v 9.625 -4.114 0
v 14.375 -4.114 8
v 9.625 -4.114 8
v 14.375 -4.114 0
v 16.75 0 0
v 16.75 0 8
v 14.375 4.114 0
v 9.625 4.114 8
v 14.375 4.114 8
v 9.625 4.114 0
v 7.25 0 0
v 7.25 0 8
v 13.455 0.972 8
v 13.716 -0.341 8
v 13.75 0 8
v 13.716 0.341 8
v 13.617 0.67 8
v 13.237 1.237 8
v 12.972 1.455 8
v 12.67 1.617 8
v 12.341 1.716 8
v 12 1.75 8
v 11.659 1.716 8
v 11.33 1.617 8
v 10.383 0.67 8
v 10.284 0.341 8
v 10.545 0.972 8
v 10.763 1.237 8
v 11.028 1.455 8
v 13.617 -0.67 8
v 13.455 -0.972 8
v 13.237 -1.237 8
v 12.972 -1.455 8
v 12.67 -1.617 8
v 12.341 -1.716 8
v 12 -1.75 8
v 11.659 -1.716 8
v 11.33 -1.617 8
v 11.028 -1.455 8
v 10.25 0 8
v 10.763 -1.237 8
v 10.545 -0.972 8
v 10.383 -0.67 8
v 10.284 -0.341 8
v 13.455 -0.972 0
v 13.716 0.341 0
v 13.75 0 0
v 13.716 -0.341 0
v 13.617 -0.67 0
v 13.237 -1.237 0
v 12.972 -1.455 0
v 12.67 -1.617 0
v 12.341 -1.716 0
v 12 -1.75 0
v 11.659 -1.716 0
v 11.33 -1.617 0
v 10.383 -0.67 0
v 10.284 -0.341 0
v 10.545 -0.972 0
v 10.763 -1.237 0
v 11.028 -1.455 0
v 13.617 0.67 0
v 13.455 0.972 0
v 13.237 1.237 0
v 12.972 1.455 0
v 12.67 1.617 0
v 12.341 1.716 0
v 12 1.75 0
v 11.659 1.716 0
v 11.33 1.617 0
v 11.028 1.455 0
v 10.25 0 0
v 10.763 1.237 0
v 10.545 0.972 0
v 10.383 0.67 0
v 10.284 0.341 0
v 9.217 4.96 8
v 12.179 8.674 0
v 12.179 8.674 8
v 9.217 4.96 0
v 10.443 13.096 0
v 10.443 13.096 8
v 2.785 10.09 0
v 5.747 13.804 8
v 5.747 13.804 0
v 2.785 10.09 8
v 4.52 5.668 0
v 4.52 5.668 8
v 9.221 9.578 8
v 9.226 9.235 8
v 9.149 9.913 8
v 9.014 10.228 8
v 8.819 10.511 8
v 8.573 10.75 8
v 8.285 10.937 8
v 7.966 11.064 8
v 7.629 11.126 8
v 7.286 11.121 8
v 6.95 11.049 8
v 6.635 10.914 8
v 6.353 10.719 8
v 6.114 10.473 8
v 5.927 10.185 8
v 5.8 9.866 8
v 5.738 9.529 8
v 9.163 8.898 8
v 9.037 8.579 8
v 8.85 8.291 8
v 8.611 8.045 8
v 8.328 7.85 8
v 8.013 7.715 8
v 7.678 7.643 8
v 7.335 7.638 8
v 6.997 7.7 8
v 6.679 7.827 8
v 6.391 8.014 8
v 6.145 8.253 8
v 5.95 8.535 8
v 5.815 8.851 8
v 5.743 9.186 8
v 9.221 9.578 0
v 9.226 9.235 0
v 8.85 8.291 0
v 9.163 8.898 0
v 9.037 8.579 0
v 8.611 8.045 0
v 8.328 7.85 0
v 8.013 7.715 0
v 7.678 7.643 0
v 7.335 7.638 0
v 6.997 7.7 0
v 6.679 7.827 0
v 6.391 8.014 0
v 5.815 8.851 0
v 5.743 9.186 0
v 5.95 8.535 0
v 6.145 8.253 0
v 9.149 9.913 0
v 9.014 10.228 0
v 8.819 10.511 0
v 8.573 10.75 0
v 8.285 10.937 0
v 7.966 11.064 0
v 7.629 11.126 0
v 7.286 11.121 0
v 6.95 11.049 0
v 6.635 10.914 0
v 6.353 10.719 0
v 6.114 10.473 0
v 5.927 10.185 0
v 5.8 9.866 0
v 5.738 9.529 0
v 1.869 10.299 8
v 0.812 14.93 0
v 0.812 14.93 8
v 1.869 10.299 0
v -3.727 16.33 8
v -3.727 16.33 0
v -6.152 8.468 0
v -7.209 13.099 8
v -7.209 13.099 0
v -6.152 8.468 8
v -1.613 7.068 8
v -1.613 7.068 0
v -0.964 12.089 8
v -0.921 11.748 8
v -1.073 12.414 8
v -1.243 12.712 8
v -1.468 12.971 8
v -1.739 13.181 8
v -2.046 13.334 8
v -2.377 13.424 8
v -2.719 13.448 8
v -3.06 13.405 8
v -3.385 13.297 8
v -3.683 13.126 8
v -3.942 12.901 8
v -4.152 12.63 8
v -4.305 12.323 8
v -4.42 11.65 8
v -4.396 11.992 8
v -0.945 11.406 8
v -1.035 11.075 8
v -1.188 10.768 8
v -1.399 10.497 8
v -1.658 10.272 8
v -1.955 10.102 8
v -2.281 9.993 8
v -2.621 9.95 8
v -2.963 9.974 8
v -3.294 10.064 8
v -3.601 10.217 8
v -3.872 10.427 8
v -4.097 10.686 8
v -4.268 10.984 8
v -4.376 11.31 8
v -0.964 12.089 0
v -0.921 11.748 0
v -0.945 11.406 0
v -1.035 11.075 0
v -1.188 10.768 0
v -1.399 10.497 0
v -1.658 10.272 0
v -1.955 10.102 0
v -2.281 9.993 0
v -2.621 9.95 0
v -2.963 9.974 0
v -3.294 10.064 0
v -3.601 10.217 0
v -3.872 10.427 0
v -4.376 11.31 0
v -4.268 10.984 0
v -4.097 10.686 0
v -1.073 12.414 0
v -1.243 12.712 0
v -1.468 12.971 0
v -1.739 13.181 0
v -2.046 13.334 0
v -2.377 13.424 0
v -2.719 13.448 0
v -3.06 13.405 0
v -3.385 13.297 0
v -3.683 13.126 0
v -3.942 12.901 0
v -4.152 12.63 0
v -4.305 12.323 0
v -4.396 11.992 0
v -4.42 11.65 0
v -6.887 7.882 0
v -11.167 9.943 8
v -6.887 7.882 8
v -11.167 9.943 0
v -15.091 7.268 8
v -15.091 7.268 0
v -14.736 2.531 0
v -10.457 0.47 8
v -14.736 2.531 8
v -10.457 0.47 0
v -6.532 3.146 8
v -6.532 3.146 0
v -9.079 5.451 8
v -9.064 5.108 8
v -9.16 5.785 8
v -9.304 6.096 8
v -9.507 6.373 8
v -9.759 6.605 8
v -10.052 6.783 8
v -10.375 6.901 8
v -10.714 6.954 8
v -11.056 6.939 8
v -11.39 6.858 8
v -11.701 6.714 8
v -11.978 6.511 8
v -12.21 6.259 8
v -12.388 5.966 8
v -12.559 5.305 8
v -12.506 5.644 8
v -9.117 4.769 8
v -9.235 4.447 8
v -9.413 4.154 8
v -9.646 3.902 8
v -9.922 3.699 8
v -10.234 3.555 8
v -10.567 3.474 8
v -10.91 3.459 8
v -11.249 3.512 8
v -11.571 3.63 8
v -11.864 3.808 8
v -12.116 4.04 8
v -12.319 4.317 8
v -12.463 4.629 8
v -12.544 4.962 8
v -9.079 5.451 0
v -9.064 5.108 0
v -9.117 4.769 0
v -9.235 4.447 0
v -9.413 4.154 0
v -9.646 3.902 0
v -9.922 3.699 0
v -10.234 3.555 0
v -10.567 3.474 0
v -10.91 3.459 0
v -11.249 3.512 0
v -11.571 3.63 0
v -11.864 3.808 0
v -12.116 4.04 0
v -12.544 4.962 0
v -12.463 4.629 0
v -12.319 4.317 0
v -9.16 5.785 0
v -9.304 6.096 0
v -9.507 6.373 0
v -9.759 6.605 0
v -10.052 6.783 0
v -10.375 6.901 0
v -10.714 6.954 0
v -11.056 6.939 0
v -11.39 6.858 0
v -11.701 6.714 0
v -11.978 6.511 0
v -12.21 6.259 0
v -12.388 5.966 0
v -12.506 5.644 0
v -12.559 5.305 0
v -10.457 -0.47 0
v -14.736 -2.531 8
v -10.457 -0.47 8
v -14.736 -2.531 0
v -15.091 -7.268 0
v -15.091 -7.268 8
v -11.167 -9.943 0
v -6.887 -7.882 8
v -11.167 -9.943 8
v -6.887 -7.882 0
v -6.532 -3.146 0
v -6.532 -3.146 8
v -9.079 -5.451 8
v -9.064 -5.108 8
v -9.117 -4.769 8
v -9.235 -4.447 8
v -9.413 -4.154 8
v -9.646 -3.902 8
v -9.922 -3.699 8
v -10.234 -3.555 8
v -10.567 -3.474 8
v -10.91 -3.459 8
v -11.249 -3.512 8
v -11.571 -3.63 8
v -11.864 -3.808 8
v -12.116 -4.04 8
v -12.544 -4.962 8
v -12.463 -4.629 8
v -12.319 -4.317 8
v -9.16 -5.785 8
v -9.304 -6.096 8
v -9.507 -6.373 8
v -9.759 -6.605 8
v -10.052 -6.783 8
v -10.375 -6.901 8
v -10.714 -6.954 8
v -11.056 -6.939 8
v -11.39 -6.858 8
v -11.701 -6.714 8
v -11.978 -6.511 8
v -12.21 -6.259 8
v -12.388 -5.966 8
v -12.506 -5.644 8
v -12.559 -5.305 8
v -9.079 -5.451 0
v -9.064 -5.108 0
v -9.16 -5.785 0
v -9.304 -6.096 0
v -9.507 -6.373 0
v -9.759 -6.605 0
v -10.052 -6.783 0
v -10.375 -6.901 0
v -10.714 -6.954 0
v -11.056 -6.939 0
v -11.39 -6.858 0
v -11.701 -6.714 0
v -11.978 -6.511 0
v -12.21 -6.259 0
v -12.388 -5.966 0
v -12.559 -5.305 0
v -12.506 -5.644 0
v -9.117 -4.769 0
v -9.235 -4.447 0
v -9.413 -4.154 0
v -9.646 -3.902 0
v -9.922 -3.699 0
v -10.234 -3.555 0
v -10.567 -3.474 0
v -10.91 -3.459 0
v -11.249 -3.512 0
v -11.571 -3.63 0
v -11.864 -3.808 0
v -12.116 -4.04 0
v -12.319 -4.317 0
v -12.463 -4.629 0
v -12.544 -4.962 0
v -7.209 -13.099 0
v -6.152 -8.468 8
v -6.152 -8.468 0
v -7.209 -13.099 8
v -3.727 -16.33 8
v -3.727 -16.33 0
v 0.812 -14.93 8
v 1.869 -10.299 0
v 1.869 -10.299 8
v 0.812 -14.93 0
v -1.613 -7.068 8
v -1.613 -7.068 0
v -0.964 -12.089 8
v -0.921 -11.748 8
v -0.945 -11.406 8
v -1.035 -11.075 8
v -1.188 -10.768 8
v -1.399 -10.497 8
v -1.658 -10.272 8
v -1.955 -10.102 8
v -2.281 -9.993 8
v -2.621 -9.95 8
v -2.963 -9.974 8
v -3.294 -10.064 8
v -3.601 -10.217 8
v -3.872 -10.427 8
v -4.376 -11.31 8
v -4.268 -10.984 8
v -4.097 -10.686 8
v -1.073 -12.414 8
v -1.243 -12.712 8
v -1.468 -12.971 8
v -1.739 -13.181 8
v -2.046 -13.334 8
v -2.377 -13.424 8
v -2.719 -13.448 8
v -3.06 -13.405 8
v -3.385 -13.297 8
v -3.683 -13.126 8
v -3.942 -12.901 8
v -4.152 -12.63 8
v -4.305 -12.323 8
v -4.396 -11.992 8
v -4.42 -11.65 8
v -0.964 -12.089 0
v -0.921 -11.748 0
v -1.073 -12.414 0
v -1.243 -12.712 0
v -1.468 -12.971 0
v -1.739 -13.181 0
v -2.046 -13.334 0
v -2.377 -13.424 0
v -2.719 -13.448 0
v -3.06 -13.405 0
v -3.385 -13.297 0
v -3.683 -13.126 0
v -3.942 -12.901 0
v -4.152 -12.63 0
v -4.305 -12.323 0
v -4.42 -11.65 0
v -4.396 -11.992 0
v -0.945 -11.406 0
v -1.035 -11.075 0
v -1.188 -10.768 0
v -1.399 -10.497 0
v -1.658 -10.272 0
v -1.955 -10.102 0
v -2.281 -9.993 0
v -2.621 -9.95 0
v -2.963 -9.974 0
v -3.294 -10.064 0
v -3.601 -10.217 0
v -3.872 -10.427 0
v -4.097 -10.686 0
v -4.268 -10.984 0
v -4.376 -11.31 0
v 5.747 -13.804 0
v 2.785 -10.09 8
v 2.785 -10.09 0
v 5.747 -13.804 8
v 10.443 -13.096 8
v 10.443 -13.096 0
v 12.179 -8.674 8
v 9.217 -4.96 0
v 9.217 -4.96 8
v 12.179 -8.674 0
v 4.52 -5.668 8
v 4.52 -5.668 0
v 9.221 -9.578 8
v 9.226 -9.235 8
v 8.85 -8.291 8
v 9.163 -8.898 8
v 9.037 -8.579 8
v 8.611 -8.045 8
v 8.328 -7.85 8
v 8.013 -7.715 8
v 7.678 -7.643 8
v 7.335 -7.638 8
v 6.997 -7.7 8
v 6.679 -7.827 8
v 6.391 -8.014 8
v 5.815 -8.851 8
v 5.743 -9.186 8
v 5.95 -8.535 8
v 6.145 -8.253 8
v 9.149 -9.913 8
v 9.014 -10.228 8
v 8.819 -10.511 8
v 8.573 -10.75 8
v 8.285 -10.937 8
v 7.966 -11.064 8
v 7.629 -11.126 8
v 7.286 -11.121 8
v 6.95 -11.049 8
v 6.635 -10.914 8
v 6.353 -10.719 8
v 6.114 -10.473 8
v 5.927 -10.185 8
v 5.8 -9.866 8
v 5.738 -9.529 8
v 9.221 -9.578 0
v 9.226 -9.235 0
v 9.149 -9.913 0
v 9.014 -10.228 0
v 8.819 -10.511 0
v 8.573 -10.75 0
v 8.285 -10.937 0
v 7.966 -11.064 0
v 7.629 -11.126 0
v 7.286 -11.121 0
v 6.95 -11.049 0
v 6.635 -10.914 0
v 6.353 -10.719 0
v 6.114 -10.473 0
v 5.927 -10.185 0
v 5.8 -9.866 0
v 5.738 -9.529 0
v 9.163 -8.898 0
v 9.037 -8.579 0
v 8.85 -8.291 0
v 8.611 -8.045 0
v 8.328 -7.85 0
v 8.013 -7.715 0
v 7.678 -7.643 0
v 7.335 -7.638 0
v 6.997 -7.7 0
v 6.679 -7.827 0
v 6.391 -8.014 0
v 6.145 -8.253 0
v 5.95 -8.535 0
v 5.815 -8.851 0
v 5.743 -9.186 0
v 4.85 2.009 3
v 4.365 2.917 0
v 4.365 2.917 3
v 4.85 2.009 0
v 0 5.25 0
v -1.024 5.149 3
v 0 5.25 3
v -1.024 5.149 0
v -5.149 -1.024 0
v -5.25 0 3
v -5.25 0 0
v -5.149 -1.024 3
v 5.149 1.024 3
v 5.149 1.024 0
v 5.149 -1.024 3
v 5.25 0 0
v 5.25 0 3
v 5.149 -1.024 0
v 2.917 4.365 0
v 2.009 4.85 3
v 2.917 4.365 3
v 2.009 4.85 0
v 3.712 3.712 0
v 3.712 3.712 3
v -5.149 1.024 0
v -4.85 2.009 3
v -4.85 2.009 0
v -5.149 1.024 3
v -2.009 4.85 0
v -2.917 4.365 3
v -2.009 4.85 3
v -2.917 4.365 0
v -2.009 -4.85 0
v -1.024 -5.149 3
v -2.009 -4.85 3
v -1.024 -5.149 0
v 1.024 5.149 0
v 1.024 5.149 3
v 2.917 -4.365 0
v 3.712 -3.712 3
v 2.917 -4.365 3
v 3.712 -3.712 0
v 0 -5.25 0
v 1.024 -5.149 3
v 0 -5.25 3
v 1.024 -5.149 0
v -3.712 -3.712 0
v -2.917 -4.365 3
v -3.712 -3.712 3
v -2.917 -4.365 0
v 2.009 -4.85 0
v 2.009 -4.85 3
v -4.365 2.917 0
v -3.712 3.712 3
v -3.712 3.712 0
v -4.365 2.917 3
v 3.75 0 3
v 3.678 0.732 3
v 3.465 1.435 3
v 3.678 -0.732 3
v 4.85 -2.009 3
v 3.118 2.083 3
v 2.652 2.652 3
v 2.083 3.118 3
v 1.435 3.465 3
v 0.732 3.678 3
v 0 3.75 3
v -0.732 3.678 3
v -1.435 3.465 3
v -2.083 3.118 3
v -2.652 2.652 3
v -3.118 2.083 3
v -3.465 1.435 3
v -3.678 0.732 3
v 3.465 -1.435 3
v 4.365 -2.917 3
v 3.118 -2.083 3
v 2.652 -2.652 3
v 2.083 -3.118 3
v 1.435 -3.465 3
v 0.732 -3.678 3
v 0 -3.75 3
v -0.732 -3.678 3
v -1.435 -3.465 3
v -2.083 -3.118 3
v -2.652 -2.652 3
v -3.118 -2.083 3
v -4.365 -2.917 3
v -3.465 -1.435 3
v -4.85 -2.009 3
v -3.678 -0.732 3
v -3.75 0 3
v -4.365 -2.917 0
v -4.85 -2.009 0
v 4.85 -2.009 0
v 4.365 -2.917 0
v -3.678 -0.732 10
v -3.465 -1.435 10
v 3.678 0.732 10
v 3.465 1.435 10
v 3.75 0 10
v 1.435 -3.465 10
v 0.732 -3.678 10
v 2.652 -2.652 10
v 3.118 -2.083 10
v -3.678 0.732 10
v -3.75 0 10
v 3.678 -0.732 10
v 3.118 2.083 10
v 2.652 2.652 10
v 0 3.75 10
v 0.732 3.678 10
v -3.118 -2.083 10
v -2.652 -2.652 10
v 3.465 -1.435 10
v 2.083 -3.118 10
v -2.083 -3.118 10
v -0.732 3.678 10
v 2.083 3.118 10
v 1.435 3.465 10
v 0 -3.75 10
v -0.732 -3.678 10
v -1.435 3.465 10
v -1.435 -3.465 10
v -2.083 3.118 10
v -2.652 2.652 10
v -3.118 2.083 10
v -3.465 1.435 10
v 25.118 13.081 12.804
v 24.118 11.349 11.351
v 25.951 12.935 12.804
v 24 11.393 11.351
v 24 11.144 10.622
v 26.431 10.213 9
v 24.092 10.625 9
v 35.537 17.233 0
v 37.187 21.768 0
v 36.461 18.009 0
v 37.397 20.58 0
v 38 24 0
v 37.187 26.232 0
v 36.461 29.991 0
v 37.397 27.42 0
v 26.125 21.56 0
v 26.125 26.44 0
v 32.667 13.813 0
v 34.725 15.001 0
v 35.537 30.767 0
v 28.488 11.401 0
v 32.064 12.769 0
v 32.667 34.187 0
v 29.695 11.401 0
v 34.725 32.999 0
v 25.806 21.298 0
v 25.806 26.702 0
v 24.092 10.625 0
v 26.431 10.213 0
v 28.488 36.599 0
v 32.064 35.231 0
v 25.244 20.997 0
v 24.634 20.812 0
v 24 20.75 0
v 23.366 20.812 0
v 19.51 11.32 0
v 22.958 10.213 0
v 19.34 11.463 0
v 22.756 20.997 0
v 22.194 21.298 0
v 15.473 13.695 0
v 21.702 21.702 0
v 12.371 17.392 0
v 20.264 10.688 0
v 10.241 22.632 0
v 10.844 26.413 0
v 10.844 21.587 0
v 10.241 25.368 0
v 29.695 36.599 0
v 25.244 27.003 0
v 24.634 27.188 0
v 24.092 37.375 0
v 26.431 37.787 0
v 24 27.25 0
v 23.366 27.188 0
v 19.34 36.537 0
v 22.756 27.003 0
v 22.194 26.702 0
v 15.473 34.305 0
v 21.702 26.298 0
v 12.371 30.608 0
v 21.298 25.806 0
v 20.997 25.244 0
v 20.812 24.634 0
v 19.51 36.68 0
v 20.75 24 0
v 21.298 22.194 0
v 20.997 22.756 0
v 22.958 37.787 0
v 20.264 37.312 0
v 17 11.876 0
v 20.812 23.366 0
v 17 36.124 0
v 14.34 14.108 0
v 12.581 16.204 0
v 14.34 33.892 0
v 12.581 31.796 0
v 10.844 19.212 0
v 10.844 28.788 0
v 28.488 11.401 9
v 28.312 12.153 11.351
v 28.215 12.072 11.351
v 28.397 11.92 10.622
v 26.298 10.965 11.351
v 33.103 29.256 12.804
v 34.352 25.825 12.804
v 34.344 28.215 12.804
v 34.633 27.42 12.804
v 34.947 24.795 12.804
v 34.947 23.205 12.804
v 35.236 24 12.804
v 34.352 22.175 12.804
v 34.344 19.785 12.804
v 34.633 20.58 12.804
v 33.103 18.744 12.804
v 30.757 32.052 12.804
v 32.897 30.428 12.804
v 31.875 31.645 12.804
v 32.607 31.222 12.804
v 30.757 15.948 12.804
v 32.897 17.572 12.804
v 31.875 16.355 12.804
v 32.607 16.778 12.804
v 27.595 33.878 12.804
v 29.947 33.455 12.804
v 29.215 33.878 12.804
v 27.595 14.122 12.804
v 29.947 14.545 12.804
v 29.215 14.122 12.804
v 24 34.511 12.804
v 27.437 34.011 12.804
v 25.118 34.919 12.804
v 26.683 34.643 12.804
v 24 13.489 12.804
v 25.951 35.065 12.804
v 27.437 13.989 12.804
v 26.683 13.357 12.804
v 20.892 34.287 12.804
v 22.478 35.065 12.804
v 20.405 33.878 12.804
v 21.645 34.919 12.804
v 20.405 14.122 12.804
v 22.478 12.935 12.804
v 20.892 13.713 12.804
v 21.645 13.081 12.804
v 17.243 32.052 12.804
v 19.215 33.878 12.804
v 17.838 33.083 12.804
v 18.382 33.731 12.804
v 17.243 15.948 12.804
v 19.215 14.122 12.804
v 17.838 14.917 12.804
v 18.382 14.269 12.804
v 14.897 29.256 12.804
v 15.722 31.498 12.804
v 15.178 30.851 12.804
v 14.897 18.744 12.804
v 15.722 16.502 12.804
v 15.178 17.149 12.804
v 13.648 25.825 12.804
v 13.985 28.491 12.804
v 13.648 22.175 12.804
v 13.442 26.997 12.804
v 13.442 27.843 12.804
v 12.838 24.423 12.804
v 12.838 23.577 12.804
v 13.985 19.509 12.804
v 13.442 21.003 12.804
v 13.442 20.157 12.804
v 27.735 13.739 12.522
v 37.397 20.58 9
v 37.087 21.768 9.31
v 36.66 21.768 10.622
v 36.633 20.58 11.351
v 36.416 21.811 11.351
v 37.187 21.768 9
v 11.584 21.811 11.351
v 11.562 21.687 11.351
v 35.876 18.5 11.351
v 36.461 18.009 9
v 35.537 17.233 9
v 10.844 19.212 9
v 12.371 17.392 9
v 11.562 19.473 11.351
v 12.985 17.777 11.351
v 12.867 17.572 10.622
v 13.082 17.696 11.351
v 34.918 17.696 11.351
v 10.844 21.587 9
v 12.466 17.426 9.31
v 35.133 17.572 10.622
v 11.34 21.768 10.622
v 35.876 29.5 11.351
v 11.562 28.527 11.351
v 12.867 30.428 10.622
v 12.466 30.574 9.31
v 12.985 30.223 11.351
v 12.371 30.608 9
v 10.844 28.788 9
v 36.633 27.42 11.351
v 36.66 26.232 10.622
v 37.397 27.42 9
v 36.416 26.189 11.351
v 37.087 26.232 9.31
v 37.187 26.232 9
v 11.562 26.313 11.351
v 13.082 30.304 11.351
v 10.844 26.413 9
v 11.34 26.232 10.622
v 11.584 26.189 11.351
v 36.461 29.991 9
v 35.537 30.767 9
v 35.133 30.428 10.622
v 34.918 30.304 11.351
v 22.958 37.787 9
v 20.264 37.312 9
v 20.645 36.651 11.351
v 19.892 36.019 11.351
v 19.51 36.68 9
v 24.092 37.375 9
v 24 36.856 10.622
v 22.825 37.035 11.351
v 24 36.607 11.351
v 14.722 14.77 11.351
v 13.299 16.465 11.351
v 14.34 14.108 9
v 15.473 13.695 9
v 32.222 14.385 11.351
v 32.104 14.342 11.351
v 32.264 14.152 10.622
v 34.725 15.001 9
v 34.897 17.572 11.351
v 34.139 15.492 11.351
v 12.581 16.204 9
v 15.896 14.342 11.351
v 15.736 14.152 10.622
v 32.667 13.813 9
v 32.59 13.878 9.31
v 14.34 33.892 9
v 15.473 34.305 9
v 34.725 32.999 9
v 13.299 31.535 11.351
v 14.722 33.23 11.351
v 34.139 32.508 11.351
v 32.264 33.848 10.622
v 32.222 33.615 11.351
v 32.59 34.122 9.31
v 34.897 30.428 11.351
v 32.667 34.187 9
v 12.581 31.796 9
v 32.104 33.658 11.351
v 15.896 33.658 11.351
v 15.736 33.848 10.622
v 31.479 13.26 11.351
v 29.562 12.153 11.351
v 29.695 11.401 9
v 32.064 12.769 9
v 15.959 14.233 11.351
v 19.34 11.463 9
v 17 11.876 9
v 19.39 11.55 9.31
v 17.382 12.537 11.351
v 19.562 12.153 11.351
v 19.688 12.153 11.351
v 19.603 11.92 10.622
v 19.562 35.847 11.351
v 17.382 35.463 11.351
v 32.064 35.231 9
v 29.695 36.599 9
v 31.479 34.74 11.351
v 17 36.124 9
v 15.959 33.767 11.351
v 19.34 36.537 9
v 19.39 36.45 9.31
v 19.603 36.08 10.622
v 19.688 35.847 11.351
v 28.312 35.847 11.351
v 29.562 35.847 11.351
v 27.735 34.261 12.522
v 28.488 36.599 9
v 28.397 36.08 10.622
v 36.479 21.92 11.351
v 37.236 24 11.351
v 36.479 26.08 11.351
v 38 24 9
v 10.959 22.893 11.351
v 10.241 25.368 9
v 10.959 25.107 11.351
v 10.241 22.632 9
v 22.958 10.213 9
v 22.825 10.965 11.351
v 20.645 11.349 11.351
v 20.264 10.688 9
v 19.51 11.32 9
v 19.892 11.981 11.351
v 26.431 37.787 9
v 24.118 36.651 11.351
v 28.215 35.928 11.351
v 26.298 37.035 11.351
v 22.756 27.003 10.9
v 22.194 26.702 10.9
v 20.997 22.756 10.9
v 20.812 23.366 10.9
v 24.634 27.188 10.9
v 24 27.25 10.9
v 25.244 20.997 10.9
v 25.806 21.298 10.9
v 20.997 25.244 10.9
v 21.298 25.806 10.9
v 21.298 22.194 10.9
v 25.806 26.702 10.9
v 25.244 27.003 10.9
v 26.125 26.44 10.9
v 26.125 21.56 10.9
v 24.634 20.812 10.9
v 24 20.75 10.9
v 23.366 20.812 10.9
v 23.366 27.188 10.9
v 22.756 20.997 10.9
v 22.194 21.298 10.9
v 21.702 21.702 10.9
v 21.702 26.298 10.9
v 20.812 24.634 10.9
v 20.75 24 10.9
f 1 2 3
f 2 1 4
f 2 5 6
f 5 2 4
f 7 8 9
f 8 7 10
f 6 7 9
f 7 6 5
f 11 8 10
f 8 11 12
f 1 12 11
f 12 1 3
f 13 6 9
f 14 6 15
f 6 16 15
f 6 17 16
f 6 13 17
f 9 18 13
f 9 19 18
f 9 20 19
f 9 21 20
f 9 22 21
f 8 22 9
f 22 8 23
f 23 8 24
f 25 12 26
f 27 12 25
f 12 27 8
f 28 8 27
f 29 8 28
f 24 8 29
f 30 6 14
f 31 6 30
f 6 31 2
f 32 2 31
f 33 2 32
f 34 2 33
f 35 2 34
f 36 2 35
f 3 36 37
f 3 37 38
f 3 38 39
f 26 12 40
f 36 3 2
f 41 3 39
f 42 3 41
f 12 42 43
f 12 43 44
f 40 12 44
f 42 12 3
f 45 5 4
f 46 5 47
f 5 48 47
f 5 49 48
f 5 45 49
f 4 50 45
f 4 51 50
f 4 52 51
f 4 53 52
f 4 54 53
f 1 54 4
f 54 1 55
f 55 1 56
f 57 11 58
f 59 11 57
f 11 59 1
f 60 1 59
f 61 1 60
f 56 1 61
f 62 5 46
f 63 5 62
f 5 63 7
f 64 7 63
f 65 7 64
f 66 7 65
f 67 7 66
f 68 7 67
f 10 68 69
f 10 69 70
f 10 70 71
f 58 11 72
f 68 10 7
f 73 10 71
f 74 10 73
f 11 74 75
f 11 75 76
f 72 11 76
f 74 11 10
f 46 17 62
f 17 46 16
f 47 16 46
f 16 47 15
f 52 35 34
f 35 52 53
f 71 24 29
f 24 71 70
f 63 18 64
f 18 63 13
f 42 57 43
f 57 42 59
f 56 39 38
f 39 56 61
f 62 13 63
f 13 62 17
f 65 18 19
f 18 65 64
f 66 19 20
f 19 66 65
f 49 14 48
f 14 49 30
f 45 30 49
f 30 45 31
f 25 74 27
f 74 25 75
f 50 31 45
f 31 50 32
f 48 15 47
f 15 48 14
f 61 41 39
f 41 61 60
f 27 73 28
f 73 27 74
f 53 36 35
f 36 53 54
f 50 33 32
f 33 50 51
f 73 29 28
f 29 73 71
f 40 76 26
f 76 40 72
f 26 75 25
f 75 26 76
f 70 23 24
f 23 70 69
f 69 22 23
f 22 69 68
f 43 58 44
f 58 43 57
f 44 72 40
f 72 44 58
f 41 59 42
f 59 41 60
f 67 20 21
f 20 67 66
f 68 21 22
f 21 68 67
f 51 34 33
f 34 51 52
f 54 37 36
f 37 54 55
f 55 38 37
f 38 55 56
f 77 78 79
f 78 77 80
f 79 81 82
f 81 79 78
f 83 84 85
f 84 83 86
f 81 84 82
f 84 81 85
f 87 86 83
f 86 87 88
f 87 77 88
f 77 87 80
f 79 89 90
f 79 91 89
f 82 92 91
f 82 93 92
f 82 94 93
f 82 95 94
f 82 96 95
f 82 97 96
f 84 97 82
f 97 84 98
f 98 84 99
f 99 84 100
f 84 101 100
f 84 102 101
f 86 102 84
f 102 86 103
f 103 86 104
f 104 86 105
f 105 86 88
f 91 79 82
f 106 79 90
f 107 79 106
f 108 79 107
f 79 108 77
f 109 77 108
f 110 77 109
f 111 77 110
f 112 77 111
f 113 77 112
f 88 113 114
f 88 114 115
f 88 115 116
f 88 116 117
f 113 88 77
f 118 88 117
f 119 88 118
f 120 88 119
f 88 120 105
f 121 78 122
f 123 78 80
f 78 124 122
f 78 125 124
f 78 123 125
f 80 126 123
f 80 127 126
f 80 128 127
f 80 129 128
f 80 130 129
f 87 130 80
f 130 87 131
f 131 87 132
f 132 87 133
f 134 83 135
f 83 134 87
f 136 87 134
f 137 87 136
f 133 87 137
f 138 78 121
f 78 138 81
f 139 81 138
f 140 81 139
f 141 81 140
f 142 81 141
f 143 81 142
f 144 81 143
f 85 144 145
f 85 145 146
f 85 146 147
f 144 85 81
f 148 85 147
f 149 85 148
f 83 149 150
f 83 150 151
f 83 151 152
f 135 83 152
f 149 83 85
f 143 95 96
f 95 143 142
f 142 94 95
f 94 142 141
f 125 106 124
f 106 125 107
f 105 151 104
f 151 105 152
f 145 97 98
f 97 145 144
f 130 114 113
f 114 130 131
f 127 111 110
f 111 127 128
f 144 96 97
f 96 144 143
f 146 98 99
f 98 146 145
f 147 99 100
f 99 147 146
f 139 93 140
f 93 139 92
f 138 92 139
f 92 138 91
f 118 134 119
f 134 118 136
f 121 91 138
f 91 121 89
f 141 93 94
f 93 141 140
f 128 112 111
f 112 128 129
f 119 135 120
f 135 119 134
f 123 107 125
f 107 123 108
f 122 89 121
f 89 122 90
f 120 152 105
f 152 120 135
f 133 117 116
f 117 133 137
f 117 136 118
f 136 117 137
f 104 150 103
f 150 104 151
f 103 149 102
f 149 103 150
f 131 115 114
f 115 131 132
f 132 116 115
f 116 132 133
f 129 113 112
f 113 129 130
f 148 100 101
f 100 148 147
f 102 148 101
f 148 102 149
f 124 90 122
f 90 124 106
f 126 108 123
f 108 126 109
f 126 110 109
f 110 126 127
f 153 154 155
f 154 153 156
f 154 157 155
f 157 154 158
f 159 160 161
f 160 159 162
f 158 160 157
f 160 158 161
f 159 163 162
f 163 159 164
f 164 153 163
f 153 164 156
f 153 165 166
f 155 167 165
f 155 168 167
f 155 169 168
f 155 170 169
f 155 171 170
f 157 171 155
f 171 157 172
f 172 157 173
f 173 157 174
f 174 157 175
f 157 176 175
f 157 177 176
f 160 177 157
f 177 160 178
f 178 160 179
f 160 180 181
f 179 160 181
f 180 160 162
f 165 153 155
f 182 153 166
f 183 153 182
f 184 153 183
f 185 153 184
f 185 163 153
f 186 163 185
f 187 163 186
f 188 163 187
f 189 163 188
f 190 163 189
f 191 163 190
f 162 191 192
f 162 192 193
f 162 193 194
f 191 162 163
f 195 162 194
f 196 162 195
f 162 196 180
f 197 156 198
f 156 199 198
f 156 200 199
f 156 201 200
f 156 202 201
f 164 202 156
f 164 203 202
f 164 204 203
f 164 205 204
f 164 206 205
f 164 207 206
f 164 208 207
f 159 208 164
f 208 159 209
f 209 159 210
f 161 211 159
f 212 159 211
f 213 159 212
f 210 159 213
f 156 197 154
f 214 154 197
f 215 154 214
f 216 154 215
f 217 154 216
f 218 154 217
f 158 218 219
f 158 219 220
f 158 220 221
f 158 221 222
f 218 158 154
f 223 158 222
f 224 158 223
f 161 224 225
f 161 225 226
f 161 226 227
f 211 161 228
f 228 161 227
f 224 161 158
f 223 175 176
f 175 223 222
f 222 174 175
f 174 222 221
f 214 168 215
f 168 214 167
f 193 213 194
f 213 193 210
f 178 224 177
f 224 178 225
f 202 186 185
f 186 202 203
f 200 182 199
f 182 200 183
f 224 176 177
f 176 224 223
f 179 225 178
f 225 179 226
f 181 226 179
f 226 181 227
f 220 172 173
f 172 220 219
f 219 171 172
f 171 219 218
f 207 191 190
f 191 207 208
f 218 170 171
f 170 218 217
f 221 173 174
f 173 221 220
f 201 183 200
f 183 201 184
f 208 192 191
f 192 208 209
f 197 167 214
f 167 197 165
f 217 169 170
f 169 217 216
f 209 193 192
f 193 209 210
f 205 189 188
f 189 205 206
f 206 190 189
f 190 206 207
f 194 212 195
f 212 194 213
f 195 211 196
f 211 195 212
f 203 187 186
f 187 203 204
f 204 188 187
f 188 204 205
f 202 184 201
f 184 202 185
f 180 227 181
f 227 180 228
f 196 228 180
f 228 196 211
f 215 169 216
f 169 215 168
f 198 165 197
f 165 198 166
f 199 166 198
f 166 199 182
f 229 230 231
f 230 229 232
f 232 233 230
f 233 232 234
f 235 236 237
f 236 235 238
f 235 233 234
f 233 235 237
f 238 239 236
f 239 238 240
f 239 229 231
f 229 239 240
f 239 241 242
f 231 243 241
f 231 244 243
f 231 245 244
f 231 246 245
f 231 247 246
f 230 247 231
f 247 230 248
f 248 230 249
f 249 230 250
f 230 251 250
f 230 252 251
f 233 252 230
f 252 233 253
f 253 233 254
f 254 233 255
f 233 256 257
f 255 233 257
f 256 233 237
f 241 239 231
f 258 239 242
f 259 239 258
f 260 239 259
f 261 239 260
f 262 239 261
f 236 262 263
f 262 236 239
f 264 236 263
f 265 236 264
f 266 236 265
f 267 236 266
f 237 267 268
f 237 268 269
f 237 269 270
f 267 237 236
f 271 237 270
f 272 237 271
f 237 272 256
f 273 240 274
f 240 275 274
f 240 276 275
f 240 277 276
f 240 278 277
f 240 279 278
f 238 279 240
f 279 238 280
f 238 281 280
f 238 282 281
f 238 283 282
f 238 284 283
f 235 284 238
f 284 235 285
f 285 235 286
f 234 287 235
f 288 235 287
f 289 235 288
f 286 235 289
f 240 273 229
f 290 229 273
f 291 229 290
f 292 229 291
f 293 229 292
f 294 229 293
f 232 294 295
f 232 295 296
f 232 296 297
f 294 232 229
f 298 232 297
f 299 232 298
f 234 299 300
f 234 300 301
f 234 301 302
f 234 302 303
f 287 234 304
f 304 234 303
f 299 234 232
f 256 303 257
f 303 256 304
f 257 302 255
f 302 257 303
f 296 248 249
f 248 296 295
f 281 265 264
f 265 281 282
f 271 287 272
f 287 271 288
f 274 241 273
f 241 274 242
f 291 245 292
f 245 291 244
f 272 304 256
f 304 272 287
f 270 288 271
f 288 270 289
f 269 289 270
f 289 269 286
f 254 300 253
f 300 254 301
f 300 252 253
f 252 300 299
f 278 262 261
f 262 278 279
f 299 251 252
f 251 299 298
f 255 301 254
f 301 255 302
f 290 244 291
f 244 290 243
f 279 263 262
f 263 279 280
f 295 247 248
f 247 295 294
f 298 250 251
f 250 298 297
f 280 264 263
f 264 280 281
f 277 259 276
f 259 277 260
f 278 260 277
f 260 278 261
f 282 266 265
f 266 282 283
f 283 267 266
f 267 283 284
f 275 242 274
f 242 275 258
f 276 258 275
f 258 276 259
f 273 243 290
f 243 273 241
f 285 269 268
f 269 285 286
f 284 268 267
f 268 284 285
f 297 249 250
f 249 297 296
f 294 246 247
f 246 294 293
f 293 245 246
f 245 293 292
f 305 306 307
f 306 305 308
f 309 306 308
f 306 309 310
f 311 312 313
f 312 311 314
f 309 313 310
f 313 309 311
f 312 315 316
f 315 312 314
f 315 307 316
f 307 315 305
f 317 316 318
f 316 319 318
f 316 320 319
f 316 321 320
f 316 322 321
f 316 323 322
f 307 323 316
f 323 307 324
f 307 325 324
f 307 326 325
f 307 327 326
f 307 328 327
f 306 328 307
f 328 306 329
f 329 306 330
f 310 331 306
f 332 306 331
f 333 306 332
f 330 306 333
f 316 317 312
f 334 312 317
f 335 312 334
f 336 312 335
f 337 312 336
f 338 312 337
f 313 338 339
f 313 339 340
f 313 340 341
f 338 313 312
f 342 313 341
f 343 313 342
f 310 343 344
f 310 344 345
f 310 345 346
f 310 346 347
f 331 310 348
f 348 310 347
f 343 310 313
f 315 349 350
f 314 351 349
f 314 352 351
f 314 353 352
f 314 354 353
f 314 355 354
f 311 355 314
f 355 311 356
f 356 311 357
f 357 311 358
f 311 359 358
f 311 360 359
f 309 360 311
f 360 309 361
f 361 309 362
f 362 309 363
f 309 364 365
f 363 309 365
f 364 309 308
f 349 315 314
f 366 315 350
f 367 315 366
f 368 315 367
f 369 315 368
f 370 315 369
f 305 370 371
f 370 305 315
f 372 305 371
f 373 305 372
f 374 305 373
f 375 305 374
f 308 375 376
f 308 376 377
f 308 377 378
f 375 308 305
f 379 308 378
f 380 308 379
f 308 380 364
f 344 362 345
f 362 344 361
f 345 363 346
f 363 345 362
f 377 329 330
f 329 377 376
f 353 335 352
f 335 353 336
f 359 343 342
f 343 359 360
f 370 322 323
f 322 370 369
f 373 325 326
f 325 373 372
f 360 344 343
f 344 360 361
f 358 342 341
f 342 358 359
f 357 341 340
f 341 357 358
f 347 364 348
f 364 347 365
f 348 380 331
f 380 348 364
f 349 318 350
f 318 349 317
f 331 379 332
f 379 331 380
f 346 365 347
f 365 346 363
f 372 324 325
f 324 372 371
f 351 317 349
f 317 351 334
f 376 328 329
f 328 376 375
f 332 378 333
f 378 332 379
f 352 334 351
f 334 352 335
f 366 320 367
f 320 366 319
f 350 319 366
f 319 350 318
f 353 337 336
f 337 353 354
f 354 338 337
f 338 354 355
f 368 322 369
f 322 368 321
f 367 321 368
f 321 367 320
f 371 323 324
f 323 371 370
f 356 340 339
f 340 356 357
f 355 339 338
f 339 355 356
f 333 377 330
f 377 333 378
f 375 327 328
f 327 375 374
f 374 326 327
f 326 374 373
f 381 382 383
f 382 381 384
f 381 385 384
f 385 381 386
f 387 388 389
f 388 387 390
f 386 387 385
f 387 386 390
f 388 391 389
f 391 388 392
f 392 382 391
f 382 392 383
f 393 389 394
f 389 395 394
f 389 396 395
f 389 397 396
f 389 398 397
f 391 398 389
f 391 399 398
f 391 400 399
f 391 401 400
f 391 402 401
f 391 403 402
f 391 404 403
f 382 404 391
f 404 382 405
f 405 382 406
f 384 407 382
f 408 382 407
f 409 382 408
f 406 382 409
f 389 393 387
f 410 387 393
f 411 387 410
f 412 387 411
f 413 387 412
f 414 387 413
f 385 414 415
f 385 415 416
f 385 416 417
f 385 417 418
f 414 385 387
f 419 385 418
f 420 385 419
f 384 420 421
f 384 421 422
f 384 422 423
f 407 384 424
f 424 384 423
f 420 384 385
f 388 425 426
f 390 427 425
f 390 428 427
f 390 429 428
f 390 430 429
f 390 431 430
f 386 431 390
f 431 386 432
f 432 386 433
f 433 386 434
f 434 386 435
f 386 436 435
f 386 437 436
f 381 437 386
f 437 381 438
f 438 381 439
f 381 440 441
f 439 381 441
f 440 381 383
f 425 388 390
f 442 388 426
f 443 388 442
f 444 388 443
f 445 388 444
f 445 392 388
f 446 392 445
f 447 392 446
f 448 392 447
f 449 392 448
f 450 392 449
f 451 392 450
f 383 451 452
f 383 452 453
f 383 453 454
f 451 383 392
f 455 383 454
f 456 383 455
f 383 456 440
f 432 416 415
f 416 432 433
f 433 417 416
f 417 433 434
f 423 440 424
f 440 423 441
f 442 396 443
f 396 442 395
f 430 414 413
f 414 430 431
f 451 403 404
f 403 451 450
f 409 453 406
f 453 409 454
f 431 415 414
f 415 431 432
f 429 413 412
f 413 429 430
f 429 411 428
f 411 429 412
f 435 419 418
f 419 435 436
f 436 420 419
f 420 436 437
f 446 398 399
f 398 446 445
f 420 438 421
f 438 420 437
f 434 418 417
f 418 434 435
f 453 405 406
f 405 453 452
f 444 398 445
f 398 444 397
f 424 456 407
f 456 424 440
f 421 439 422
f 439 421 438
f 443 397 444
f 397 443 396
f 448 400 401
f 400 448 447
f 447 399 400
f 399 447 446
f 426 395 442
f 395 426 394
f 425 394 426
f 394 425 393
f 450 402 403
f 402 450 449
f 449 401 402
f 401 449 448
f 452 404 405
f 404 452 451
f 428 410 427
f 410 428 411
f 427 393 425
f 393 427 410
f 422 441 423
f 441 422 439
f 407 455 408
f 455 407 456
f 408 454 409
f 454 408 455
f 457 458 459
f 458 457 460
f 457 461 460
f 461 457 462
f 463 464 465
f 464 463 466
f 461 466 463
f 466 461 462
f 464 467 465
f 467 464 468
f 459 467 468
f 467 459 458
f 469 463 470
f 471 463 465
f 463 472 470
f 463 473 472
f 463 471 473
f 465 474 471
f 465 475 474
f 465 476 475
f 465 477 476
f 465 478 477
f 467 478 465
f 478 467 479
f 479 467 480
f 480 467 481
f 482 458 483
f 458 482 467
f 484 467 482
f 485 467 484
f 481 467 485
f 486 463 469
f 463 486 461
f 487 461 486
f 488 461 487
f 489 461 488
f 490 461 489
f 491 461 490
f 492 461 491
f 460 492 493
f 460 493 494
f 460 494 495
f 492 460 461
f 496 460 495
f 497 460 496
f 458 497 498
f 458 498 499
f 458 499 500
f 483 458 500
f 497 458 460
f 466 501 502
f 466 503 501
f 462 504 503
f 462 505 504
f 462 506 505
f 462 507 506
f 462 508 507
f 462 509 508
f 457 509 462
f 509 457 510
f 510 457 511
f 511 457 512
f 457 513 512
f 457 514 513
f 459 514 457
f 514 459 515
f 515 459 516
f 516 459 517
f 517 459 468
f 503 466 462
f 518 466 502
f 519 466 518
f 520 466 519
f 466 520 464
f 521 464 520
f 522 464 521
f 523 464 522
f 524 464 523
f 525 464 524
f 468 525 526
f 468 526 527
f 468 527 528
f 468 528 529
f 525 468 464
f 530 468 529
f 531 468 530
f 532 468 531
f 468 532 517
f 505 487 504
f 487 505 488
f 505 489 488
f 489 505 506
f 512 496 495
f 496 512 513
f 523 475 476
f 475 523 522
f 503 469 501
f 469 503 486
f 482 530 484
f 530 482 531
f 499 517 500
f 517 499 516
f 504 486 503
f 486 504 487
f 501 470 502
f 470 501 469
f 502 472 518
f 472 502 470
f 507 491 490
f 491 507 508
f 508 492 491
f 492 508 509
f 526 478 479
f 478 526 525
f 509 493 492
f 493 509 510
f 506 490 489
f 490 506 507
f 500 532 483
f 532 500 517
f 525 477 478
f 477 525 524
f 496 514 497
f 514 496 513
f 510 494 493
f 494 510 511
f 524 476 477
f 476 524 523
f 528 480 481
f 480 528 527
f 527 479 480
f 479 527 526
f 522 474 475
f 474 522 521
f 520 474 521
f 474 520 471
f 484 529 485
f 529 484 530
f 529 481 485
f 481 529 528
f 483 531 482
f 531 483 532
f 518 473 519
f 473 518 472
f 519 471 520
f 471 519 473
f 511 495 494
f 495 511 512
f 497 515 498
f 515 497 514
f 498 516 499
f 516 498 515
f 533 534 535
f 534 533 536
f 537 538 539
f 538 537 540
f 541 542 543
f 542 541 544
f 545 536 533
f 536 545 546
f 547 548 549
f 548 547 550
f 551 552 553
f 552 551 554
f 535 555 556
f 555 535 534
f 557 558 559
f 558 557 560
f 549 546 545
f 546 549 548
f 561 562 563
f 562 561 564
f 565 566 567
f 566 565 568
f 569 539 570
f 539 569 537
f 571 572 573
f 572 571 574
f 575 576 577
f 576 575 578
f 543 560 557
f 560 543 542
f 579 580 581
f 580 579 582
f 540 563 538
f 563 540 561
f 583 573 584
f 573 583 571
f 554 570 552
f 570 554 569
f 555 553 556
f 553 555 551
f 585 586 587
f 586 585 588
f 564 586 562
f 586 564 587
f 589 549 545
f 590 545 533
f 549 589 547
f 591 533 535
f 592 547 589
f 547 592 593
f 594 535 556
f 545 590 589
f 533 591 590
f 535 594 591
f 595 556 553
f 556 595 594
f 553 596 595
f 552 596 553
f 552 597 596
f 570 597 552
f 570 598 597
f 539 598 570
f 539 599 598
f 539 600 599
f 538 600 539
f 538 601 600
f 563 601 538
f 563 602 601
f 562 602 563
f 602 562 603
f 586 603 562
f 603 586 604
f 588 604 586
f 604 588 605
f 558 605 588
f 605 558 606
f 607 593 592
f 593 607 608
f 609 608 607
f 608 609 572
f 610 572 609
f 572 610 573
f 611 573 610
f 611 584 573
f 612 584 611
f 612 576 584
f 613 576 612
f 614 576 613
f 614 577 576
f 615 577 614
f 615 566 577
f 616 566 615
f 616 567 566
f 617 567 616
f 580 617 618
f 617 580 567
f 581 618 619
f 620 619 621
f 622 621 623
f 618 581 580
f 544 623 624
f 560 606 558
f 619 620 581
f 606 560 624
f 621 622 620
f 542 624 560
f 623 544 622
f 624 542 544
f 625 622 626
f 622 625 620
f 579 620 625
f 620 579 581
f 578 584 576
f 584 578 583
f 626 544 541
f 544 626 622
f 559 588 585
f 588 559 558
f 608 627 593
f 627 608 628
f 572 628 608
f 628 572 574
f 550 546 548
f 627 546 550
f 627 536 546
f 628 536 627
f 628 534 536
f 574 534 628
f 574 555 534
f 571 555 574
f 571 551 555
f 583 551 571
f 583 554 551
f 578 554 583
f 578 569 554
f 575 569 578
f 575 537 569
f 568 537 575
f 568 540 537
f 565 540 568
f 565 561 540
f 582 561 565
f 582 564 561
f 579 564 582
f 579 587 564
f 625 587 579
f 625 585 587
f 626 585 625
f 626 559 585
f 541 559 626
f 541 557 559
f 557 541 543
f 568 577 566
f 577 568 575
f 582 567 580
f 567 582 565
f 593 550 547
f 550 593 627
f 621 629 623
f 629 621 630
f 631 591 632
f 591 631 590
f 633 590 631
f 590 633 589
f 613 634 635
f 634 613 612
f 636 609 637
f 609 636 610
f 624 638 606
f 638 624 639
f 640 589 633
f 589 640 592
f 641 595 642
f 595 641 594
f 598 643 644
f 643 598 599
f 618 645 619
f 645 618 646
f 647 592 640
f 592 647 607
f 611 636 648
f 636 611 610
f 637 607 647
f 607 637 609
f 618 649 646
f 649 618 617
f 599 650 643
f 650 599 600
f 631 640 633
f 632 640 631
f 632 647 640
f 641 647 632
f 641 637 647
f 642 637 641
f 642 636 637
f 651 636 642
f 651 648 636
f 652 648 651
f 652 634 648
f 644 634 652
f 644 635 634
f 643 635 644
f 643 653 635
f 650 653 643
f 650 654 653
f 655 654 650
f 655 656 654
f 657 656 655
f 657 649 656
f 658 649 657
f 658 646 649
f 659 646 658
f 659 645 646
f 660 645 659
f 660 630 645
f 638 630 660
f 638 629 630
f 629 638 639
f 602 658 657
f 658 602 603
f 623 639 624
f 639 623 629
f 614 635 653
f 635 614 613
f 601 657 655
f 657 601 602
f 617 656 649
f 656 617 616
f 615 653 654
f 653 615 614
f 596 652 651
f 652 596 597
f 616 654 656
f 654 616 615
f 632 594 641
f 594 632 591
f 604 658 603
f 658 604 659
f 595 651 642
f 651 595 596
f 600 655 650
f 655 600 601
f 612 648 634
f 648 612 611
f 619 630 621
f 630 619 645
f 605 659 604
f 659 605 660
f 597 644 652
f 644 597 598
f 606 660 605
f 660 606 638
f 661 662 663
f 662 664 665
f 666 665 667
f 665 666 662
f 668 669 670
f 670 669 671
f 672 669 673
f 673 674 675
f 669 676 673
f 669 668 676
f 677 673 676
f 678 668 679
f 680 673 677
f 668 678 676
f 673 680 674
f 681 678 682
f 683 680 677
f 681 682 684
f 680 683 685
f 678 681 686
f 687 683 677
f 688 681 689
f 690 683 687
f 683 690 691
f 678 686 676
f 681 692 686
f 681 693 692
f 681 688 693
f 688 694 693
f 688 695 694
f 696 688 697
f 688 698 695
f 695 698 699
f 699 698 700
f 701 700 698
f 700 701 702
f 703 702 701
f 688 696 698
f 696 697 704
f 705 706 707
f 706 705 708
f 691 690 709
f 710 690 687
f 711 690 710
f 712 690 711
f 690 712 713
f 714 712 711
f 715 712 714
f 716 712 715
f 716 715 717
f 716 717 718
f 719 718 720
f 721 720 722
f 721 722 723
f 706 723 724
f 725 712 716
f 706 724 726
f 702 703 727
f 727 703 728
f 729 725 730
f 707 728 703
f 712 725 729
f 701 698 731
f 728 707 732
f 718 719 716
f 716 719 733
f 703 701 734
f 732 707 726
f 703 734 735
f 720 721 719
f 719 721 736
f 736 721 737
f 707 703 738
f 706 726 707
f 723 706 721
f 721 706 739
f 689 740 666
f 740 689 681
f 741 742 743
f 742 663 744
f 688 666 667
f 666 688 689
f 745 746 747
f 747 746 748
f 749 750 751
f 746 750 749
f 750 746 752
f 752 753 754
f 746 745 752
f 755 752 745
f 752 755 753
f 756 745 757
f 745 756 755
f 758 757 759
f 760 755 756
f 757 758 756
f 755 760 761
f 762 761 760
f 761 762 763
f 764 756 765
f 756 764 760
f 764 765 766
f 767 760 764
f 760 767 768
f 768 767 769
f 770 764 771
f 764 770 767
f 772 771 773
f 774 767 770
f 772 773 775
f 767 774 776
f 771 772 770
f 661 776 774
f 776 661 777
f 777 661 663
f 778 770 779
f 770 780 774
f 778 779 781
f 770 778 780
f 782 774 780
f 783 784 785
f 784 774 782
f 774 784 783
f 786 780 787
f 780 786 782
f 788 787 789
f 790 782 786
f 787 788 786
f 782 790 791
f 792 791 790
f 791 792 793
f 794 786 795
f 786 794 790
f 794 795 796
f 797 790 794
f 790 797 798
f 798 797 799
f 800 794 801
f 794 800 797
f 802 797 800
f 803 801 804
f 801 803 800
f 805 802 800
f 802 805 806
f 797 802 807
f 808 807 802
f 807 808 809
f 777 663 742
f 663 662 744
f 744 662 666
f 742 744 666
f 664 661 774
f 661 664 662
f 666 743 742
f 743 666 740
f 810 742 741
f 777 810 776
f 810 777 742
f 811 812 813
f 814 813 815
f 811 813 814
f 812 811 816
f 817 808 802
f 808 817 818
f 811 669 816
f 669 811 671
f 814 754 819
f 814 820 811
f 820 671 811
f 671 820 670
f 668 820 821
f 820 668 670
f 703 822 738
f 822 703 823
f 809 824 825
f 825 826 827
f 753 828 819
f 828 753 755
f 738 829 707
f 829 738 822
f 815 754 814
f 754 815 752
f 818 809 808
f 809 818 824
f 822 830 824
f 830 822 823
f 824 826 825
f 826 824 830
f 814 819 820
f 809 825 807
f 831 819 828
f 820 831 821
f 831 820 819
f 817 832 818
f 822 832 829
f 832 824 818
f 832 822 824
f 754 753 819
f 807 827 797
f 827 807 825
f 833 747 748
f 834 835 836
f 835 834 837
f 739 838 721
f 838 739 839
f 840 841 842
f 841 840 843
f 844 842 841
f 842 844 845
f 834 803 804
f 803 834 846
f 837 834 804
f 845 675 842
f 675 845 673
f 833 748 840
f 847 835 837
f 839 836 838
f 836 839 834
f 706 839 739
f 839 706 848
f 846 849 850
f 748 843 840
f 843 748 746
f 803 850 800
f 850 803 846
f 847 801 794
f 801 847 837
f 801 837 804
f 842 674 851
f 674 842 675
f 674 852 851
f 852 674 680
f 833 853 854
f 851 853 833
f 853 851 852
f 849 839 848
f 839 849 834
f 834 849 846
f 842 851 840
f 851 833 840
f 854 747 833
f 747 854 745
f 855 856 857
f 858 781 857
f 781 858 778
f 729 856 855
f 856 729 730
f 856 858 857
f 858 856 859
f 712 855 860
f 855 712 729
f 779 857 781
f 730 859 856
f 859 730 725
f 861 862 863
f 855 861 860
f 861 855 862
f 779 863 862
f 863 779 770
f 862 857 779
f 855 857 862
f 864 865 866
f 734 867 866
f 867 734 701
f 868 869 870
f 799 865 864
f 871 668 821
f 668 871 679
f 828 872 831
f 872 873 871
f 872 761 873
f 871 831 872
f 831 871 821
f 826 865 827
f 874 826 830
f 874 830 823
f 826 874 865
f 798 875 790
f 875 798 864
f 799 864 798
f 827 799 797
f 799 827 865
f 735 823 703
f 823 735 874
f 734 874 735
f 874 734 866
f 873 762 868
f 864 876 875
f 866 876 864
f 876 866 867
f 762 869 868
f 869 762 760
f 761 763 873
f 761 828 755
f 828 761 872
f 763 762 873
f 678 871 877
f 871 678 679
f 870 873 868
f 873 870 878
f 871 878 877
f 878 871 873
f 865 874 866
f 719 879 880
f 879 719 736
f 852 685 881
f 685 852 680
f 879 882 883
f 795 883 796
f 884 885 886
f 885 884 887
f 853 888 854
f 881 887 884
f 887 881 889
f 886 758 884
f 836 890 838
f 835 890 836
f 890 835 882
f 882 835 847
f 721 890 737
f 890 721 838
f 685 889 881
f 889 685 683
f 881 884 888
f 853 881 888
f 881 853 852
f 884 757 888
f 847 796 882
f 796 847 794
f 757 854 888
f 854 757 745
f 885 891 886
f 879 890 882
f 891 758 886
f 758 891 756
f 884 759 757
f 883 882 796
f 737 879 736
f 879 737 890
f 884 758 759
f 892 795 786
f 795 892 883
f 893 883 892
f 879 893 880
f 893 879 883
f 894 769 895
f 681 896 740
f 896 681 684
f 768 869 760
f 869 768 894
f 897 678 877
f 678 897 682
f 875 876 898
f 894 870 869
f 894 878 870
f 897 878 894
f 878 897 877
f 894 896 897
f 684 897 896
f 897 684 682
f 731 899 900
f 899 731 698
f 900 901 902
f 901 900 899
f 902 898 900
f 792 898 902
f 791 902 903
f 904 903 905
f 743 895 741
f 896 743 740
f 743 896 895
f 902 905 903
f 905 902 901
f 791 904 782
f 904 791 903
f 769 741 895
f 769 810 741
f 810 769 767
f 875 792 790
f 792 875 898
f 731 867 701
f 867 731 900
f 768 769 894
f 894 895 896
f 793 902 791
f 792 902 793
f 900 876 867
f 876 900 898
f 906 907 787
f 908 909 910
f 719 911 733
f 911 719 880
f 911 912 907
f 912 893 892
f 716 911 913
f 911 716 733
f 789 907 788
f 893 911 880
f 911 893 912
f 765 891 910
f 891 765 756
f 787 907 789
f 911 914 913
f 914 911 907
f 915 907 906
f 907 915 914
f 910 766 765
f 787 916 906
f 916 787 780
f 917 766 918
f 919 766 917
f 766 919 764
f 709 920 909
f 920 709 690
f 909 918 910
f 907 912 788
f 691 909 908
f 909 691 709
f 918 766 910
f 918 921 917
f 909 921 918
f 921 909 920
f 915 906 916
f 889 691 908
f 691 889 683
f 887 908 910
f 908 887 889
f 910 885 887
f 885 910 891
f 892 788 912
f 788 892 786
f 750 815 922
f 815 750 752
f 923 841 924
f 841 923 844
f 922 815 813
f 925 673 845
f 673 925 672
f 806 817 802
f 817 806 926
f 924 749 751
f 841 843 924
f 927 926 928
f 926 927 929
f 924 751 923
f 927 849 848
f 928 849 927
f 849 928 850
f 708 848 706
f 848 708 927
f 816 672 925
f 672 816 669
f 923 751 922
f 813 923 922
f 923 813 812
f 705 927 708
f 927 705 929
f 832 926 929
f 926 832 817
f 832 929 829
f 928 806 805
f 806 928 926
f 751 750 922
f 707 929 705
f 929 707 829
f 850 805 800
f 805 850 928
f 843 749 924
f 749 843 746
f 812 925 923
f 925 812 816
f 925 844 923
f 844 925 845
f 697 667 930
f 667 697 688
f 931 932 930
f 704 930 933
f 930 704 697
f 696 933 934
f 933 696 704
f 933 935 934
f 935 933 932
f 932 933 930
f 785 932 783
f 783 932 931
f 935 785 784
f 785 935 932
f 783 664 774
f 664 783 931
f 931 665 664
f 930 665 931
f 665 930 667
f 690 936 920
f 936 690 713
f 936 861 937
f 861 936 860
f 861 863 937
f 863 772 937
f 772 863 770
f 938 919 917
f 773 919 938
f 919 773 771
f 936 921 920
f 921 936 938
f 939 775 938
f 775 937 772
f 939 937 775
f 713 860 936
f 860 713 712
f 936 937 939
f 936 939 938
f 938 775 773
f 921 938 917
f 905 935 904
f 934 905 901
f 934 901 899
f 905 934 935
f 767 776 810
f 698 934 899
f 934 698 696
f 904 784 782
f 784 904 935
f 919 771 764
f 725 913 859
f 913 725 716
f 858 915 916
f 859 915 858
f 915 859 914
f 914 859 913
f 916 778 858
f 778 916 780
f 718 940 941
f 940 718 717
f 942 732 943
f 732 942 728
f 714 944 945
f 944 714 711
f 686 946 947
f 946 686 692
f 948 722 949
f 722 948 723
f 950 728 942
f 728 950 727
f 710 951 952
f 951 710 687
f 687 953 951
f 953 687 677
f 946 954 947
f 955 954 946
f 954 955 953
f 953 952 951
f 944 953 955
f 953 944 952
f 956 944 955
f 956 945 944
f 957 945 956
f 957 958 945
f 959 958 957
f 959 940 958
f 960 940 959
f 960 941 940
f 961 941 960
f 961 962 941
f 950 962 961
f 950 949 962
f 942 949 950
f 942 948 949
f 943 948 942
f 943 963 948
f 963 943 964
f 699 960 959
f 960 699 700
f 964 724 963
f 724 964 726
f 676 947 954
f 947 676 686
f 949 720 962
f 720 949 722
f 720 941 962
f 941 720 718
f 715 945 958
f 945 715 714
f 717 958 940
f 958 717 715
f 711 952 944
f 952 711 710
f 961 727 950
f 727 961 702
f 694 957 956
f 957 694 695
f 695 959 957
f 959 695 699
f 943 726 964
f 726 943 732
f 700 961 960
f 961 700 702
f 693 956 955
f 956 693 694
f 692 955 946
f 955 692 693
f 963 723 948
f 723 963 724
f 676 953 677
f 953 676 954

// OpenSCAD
slop = .25;

m3_dia = 3;
m3_rad = m3_dia/2+slop;

m3_cap_dia = 5.7;
m3_cap_rad = m3_cap_dia/2+slop;
m3_cap_thick = 1.65+slop/2;
m3_cap_hex_rad = (2/cos(30))/2;

m3_nut_dia = 6.5;
m3_nut_rad = m3_nut_dia/2+slop;
m3_nut_thick = 2.4;


lm8uu_dia = 15;
lm8uu_rad = lm8uu_dia/2+slop;
lm8uu_len = 24+slop;

lm8uu_inset = 2;  //inset into frame

wall = 3;
height = 8;
switch = 4;
shaft = 6.0+slop;

$fn=32;
for(i=[0:360/7:350]) rotate([0,0,i]) translate([12,0,0]) 
	spacer();

stop_button();

translate([24,24,0]) knob();

module knob(){
	thick = 13;
	rad = 14;
	D = 5;
	mrad=4;
	difference(){
		minkowski(){
			union(){
				for(i=[0:20:40]) rotate([0,0,i]) cylinder(r=rad-mrad, h=thick-mrad, $fn=6);
			}
			intersection(){
				sphere(r=mrad, $fn=9);
				translate([0,0,10]) cube([20,20,20],center=true);
			}
		}

		//d shaft
		translate([0,0,-.1]) difference(){
			cylinder(r=(shaft+slop)/2, h=thick-2);
			translate([D+slop,0,0]) cube([shaft, shaft, (thick-2)*2],center=true);
		}
	}
}

module stop_button(){
	dia = 8;
	rad = dia/2-slop;
	base_rad = rad+wall/2;
	union(){
		cylinder(r=base_rad, h=3);
		cylinder(r=rad, h=height-switch+6);
	}
}

module spacer(h=8){
	difference(){
		cylinder(r=m3_rad+wall, h=h, $fn=6);
		
		cylinder(r=m3_rad, h=h*2.2, center=true);
	}
}

module cap_screw(len = 10){
	color([.25,.25,.25])
	difference(){
		union(){
			translate([0,0,-len/2]) rotate([0,0,-90]) cap_cylinder(r=screw_rad, h=len, center=true);
			translate([0,0,len/2-.1]) difference(){
				scale([1,1,.75]) sphere(r=cap_rad);
				translate([0,0,-cap_dia/2]) cube([cap_dia+1, cap_dia+1, cap_dia],center=true);
				translate([0,0,cap_dia/2+.1+cap_thick]) cube([cap_dia+1, cap_dia+1, cap_dia],center=true);
			}
		}
		
		translate([0,0,len/2+slop]) cylinder(r=cap_hex_rad, h=cap_thick, $fn=6);
	}
}

module cap_cylinder(r=1, h=1, center=false){
	cylinder(r=r, h=h, center=center);
	intersection(){
		rotate([0,0,22.5]) cylinder(r=r/cos(180/8), h=h, $fn=8, center=center);
		translate([0,-r/cos(180/4),0]) rotate([0,0,0]) cylinder(r=r/cos(180/4), h=h, $fn=4, center=center);
	}
}
